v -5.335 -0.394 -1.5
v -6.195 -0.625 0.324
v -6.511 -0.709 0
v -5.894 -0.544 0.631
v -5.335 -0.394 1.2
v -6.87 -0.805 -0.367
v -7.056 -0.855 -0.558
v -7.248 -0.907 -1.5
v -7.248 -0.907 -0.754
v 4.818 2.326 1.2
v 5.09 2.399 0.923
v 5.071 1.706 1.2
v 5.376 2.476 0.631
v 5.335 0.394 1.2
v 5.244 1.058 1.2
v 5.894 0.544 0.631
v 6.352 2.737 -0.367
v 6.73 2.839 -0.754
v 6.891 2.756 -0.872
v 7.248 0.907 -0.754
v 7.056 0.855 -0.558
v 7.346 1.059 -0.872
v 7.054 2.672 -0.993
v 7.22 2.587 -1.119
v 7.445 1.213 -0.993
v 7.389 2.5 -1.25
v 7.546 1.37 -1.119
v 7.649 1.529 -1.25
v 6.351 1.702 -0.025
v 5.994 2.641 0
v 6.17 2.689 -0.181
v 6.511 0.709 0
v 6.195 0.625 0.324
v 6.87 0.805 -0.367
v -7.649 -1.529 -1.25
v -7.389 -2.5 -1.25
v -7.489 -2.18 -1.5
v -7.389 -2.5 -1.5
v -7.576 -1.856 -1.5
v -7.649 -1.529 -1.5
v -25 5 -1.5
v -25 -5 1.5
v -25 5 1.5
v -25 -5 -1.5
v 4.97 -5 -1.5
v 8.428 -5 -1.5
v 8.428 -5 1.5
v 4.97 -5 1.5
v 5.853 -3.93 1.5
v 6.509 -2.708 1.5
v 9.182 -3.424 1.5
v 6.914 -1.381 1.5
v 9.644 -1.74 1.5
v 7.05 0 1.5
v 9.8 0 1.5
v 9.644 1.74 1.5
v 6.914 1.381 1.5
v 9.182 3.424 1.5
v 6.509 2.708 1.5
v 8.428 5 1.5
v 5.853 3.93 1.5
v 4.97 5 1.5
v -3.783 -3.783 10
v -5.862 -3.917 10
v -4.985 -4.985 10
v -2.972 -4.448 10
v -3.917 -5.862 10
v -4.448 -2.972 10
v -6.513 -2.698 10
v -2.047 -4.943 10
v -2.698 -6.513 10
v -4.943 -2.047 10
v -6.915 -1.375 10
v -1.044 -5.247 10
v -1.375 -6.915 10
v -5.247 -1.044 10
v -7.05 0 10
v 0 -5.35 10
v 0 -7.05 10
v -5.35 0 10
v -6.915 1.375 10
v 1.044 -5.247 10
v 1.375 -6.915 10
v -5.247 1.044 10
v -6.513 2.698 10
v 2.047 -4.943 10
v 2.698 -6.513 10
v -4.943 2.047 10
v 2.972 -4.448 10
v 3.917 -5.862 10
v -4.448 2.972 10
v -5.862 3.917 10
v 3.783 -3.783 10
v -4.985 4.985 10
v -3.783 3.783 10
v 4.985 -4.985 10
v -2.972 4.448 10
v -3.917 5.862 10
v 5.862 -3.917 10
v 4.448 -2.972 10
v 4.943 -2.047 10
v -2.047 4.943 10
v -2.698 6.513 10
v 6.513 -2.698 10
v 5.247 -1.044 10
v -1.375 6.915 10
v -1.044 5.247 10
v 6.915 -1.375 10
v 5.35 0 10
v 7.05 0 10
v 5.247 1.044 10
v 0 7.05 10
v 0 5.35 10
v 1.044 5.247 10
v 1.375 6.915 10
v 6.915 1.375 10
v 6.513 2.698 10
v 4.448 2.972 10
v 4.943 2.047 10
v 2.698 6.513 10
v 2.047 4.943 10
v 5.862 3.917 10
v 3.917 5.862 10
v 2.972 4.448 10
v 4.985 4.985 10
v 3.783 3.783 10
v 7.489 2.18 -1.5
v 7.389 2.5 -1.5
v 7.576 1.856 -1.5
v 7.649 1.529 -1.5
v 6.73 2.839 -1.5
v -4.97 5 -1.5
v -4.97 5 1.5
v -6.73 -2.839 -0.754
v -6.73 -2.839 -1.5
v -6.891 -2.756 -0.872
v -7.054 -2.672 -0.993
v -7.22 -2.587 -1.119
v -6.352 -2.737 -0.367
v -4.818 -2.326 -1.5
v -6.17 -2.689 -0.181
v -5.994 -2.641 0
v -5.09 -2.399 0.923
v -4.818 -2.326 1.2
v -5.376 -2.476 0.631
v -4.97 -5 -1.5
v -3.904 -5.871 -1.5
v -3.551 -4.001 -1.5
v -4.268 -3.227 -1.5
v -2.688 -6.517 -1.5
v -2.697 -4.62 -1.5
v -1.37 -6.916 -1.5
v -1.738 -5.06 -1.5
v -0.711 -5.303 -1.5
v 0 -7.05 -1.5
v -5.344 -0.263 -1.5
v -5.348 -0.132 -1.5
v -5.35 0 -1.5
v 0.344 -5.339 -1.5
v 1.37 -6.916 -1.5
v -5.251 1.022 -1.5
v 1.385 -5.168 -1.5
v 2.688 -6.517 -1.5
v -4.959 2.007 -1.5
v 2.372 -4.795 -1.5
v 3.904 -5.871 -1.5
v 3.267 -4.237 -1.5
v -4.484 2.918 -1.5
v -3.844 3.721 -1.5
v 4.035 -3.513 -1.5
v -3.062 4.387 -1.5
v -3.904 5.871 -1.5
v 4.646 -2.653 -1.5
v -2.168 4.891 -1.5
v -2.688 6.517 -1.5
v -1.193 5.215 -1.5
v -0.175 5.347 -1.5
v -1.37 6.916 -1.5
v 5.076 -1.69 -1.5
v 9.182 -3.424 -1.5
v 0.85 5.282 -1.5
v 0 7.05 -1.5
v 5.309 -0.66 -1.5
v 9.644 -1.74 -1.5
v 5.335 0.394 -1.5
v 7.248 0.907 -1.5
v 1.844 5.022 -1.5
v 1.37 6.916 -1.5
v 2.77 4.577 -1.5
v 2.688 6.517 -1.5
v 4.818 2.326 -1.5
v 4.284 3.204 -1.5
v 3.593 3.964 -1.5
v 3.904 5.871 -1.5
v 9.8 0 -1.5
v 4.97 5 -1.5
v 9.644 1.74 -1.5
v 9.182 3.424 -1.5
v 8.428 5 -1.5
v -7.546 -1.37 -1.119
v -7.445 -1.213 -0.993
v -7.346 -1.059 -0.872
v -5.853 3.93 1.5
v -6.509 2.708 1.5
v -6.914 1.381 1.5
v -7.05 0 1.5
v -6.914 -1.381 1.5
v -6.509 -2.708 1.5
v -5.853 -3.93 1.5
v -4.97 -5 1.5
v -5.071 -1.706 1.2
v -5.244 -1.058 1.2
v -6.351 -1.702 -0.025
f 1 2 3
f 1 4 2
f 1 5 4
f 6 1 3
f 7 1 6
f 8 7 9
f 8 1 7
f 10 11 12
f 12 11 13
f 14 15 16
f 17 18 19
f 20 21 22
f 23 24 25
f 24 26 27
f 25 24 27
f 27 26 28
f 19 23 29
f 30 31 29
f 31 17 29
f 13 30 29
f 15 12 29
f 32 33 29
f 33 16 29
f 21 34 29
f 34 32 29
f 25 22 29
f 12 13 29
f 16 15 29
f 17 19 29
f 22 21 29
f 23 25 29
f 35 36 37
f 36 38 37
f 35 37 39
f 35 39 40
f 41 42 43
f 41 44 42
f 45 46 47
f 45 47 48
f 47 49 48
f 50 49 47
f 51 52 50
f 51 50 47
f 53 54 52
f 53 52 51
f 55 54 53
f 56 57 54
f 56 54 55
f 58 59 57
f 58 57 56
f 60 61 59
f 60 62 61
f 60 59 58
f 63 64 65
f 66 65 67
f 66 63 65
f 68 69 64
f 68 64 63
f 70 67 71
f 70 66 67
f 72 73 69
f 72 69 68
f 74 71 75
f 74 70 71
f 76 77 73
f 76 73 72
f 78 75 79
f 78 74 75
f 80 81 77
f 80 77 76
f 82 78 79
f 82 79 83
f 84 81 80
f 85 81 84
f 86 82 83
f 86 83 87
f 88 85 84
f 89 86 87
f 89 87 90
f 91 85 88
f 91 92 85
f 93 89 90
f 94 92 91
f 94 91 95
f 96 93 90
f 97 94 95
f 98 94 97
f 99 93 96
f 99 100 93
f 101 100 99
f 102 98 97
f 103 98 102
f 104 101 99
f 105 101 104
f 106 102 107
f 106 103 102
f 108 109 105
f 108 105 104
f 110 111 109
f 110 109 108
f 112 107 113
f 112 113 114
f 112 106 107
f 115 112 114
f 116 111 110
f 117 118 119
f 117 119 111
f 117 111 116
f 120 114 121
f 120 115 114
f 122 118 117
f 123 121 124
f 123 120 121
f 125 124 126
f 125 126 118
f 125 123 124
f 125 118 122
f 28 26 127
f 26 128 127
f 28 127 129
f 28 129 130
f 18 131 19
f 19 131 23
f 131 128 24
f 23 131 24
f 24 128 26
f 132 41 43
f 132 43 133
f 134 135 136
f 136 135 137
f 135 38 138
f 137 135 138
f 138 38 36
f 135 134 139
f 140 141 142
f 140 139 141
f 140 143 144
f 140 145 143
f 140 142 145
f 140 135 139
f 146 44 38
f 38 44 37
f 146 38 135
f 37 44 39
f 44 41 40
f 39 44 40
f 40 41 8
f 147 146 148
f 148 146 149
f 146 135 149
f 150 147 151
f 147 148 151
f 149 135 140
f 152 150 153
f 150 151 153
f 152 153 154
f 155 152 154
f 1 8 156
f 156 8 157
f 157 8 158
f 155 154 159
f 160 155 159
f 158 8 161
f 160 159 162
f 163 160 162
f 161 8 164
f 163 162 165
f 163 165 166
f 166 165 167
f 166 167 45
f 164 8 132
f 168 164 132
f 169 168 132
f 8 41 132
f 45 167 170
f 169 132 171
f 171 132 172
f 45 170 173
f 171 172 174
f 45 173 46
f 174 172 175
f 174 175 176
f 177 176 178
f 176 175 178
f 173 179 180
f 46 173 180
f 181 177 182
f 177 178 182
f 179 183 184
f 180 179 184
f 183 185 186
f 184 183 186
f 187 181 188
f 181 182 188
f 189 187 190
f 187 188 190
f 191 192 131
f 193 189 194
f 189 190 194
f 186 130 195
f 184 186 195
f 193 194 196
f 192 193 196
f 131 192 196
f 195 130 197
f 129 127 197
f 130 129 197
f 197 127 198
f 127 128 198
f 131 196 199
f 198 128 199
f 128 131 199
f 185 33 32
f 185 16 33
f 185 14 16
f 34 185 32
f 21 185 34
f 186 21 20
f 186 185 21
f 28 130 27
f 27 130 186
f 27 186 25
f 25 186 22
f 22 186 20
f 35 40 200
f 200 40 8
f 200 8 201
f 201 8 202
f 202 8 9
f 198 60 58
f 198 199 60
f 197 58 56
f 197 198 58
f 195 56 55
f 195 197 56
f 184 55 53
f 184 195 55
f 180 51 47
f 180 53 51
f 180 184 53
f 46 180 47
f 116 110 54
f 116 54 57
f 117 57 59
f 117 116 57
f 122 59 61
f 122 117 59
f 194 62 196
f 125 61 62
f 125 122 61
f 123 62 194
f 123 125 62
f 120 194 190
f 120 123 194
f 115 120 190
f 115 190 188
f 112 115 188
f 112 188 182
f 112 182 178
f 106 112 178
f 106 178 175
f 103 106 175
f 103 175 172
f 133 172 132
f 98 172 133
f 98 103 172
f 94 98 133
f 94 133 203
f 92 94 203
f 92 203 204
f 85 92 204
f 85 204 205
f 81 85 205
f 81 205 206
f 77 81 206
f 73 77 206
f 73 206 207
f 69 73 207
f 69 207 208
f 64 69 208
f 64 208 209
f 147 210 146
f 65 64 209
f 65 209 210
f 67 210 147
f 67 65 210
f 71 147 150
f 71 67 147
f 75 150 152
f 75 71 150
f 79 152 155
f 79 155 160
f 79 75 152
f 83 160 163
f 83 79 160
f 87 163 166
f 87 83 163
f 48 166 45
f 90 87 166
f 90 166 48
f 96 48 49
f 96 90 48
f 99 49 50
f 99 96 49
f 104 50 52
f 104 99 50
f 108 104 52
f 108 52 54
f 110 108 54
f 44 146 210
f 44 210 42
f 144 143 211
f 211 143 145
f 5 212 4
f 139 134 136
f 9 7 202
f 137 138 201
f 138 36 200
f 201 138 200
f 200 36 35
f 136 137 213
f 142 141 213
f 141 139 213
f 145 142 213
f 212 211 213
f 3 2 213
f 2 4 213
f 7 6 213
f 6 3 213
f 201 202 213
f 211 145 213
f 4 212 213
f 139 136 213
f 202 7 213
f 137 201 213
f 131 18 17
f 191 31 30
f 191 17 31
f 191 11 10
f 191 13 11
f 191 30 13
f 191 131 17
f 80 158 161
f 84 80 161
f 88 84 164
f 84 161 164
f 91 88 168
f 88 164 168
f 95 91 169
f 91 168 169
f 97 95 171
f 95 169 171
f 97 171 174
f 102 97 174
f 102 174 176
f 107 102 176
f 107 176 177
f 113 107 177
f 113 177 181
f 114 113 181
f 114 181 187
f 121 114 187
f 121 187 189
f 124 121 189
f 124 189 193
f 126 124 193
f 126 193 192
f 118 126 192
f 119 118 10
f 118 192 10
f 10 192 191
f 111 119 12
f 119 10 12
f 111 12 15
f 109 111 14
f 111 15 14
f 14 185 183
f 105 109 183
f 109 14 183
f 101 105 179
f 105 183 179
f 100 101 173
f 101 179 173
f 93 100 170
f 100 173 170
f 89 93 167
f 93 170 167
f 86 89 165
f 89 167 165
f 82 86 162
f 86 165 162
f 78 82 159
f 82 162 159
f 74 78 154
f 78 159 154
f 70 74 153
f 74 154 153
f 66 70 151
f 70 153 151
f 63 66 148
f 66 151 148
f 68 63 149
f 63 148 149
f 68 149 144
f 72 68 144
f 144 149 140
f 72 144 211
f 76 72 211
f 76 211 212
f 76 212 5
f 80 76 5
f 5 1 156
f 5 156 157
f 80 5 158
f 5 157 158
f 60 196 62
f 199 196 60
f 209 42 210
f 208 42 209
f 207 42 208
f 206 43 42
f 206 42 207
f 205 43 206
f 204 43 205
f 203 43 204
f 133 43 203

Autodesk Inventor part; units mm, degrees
sketch "スケッチ1" plane through (0, 0, 0) normal (0, 0, 1) x (1, 0, 0)
  circle A0 centre (0, 0) radius 5.25
  circle A1 centre (0, 0) radius 7.05
  dimension "d0" = 10.5
  dimension "d1" = 14.1
extrude "押し出し1" add sketch "スケッチ1" along normal blind 10 and the other way blind 3.5 contours A0 | A1
sketch "スケッチ2" plane through (0, 0, 0) normal (0, 0, 1) x (1, 0, 0)
  line L0 (-25, 5) -> (0, 5)
  line L1 (0, 5) -> (0, -5)
  line L2 (0, -5) -> (-25, -5)
  line L3 (-25, -5) -> (-25, 5)
  point P0 (0, 0)
  dimension "d4" = 25
  dimension "d5" = 5
  dimension "d6" = 10
extrude "押し出し2" add sketch "スケッチ2" along normal mid plane 3
sketch "スケッチ5" plane through (0, 0, -3.5) normal (0, 0, -1) x (-1, 0, 0)
  circle A0 centre (0, 0) radius 5.35
  dimension "d21" = 10.7
extrude "押し出し5" cut sketch "スケッチ5" against normal through all
sketch "スケッチ9" plane through (0, 0, 0) normal (0, 0, 1) x (1, 0, 0)
  line L0 (8.4285, -5) -> (-7.6033, -5)
  line L1 (-7.6033, 5) -> (8.4285, 5)
  arc A0 (4.9702, -5) -> (4.9702, 5) centre (0, 0) ccw
  arc A1 (-4.9702, 5) -> (-4.9702, -5) centre (0, 0) ccw
  arc A2 (8.4285, -5) -> (8.4285, 5) centre (0, 0) ccw
  arc A3 (-7.6033, 5) -> (-7.6033, -5) centre (0, 0) ccw
  dimension "d74" = 5
  dimension "d75" = 5
  dimension "d79" = 9.8
extrude "押し出し9" add sketch "スケッチ9" along normal mid plane 3 contours L0 A0 L1 A2
sketch "スケッチ6" plane through (0, 0, -3.5) normal (0, 0, -1) x (-1, 0, 0)
  line L0 (7.2132, -2.9681) -> (-7.7309, 1.0362)
  line L1 (-7.2132, 2.9681) -> (7.7309, -1.0362)
  line L2 (11.6181, 0) -> (-15.1574, 0) projected
  arc A0 (7.2132, -2.9681) -> (7.7309, -1.0362) centre (0, 0) ccw
  arc A1 (-7.2132, 2.9681) -> (-7.7309, 1.0362) centre (0, 0) ccw
  point P0 (-11.3323, 4.0718)
  dimension "d24" = 1
  dimension "d43" = 15
  dimension "d64" = 1
  dimension "d65" = 7.8
  dimension "d66" = 7.8
extrude "押し出し6" cut sketch "スケッチ6" against normal blind 3.5
move faces "移動4" translate (0, 0, 2) faces at (5.6485, 3.107, -3.5) (-3.1586, -5.6105, -3.5)
ref_plane "作業平面1" through (0, 0, 0) normal (-0.258819, 0.9659258, 0) x (0, 0, 1)
chamfer "面取り1" distance 0.5 angle 45 4 edges at (-7.7309, -1.0362, -0.75) (7.7309, 1.0362, -0.75) (7.2132, 2.9681, -0.75) (-7.2132, -2.9681, -0.75)
chamfer "面取り2" distance 1.2 angle 45 2 edges at (5.1677, 1.3847, 0) (-5.1677, -1.3847, 0)
move faces "移動5" translate (0, 0, -1.25) faces at (-6.7087, -1.8554, 0) (6.7087, 1.8554, 0)
properties part number "HbThumbProximalPhalanxBase01" material "ABS プラスチック"
